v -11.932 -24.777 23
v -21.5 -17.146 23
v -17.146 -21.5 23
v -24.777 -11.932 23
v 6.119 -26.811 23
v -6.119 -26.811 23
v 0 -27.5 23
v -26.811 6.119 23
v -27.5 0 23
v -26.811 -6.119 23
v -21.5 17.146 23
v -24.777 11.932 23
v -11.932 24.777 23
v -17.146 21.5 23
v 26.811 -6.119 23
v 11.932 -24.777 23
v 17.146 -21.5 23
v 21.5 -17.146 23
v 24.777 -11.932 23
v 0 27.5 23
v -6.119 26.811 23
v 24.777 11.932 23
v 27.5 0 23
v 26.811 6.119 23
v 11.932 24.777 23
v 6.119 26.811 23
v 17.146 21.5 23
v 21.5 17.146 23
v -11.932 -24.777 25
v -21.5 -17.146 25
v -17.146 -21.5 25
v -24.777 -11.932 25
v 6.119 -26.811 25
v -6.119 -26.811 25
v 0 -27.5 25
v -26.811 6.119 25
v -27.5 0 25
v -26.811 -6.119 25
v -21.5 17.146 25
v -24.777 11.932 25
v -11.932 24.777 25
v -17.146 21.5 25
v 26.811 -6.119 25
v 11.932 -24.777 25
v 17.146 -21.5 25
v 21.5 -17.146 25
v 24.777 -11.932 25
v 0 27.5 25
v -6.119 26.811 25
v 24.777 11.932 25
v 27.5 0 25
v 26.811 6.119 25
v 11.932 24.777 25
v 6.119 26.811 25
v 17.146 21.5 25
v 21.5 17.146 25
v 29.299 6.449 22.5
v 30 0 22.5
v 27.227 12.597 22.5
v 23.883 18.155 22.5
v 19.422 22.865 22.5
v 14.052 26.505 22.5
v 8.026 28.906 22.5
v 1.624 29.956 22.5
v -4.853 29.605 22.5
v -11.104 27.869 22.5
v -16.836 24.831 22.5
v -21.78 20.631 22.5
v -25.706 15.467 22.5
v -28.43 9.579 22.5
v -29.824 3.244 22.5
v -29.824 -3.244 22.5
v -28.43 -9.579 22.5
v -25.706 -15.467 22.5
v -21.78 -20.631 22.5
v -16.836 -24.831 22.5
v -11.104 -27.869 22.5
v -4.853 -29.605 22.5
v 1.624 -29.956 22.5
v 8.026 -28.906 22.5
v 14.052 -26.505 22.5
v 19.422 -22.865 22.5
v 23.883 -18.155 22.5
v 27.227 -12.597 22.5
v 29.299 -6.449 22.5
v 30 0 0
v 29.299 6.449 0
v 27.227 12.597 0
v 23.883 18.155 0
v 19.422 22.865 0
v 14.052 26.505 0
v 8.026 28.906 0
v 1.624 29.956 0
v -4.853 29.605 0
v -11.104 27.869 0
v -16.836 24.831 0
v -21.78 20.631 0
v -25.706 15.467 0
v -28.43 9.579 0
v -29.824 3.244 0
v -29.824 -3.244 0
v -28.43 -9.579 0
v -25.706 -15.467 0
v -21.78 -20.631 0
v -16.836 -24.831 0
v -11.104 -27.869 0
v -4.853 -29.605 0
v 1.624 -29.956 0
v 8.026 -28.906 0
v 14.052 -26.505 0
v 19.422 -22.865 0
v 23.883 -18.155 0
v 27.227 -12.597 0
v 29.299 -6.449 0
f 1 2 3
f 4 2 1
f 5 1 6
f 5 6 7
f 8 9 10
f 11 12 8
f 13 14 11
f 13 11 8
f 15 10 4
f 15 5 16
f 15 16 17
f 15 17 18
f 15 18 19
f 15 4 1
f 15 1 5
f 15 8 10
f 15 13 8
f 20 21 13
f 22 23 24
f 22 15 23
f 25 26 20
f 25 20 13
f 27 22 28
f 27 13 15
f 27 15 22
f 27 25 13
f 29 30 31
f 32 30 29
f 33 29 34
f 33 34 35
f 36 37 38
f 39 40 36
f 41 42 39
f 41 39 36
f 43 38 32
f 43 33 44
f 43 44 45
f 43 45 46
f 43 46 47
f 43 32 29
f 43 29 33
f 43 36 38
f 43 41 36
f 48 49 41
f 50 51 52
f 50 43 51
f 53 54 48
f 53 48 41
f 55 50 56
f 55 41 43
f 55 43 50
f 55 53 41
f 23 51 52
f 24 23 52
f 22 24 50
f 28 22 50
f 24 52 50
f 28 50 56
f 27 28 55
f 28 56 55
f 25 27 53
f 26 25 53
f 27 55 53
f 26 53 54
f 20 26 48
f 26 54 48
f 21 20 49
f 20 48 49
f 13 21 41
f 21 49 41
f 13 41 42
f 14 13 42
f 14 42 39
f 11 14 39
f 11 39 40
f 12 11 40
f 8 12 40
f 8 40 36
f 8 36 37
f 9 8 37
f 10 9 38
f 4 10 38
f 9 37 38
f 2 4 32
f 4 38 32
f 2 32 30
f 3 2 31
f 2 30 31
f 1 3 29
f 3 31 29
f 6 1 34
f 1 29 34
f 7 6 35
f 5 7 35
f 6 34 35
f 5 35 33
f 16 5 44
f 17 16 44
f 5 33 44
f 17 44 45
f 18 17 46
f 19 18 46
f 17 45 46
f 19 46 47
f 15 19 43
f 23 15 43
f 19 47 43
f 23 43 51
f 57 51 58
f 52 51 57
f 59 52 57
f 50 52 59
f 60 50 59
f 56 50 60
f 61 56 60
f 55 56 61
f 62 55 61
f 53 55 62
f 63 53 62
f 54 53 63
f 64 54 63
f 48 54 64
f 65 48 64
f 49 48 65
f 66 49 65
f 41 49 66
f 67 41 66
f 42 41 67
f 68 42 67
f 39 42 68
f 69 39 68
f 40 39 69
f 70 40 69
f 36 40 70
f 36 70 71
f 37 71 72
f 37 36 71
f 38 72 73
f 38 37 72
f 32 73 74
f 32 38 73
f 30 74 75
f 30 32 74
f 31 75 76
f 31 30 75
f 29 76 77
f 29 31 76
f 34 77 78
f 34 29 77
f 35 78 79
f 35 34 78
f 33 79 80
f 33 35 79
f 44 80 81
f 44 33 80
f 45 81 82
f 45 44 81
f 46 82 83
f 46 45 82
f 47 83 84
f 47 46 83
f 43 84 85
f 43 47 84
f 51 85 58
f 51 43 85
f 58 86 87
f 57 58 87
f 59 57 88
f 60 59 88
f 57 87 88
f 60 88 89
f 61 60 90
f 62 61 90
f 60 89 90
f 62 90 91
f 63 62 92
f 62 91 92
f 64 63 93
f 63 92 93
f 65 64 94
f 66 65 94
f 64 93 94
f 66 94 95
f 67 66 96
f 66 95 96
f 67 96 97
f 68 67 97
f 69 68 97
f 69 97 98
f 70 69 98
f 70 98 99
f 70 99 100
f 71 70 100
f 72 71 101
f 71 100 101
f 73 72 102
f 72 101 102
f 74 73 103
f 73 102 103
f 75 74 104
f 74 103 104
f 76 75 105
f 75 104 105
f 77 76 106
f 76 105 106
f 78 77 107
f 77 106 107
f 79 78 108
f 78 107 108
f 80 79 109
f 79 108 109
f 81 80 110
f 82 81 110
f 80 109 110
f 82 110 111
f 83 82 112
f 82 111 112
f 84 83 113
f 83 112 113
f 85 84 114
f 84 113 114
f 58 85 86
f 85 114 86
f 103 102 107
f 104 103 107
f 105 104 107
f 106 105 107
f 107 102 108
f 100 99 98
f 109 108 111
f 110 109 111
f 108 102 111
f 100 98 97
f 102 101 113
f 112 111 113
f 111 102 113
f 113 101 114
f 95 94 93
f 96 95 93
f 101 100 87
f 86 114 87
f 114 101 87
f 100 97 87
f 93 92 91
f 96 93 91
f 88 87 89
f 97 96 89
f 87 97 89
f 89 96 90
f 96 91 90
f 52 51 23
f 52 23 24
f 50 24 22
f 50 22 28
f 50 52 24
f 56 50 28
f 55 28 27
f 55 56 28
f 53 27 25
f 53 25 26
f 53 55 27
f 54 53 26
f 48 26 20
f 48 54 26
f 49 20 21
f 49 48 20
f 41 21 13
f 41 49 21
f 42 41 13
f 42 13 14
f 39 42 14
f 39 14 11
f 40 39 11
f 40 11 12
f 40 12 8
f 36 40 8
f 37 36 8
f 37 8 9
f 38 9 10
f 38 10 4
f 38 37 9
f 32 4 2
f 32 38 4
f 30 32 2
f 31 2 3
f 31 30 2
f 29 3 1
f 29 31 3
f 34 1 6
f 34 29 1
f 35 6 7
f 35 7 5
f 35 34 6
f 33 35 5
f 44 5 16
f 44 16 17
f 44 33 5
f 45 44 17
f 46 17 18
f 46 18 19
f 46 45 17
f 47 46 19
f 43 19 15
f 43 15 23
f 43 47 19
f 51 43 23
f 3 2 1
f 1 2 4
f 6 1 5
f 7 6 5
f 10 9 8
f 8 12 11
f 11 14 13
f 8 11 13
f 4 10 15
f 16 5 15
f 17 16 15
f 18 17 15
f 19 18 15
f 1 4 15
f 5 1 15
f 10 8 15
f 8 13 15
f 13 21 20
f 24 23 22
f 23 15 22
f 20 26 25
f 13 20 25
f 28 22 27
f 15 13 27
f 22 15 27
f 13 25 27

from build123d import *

# Parameters (mm, degrees)
F0_R      = 30
F1_DEPTH  = 25
F2_SIZE   = 2.5
F1_FACE_R = 27.5
F3_DEPTH  = 2


with BuildPart() as f1:
    # F0 (on Top) → F1 (new body)
    with BuildSketch(Plane.XY):
        Circle(F0_R)
    extrude(amount=F1_DEPTH)

    # F2
    f2_edges = [f1.edges().sort_by_distance(p)[0] for p in [
        (-30, 0, 25),
    ]]
    chamfer(f2_edges, length=F2_SIZE)


with BuildPart() as f3:
    # F1_face (on face) → F3 (new body)
    with BuildSketch(Plane.XY.offset(25)):
        Circle(F1_FACE_R)
    extrude(amount=-F3_DEPTH)


with BuildPart() as f1_1:
    add(f1.part)

    # F4: cut F3
    add(f3.part, mode=Mode.SUBTRACT)


solid = Compound([f3.part, f1_1.part])
